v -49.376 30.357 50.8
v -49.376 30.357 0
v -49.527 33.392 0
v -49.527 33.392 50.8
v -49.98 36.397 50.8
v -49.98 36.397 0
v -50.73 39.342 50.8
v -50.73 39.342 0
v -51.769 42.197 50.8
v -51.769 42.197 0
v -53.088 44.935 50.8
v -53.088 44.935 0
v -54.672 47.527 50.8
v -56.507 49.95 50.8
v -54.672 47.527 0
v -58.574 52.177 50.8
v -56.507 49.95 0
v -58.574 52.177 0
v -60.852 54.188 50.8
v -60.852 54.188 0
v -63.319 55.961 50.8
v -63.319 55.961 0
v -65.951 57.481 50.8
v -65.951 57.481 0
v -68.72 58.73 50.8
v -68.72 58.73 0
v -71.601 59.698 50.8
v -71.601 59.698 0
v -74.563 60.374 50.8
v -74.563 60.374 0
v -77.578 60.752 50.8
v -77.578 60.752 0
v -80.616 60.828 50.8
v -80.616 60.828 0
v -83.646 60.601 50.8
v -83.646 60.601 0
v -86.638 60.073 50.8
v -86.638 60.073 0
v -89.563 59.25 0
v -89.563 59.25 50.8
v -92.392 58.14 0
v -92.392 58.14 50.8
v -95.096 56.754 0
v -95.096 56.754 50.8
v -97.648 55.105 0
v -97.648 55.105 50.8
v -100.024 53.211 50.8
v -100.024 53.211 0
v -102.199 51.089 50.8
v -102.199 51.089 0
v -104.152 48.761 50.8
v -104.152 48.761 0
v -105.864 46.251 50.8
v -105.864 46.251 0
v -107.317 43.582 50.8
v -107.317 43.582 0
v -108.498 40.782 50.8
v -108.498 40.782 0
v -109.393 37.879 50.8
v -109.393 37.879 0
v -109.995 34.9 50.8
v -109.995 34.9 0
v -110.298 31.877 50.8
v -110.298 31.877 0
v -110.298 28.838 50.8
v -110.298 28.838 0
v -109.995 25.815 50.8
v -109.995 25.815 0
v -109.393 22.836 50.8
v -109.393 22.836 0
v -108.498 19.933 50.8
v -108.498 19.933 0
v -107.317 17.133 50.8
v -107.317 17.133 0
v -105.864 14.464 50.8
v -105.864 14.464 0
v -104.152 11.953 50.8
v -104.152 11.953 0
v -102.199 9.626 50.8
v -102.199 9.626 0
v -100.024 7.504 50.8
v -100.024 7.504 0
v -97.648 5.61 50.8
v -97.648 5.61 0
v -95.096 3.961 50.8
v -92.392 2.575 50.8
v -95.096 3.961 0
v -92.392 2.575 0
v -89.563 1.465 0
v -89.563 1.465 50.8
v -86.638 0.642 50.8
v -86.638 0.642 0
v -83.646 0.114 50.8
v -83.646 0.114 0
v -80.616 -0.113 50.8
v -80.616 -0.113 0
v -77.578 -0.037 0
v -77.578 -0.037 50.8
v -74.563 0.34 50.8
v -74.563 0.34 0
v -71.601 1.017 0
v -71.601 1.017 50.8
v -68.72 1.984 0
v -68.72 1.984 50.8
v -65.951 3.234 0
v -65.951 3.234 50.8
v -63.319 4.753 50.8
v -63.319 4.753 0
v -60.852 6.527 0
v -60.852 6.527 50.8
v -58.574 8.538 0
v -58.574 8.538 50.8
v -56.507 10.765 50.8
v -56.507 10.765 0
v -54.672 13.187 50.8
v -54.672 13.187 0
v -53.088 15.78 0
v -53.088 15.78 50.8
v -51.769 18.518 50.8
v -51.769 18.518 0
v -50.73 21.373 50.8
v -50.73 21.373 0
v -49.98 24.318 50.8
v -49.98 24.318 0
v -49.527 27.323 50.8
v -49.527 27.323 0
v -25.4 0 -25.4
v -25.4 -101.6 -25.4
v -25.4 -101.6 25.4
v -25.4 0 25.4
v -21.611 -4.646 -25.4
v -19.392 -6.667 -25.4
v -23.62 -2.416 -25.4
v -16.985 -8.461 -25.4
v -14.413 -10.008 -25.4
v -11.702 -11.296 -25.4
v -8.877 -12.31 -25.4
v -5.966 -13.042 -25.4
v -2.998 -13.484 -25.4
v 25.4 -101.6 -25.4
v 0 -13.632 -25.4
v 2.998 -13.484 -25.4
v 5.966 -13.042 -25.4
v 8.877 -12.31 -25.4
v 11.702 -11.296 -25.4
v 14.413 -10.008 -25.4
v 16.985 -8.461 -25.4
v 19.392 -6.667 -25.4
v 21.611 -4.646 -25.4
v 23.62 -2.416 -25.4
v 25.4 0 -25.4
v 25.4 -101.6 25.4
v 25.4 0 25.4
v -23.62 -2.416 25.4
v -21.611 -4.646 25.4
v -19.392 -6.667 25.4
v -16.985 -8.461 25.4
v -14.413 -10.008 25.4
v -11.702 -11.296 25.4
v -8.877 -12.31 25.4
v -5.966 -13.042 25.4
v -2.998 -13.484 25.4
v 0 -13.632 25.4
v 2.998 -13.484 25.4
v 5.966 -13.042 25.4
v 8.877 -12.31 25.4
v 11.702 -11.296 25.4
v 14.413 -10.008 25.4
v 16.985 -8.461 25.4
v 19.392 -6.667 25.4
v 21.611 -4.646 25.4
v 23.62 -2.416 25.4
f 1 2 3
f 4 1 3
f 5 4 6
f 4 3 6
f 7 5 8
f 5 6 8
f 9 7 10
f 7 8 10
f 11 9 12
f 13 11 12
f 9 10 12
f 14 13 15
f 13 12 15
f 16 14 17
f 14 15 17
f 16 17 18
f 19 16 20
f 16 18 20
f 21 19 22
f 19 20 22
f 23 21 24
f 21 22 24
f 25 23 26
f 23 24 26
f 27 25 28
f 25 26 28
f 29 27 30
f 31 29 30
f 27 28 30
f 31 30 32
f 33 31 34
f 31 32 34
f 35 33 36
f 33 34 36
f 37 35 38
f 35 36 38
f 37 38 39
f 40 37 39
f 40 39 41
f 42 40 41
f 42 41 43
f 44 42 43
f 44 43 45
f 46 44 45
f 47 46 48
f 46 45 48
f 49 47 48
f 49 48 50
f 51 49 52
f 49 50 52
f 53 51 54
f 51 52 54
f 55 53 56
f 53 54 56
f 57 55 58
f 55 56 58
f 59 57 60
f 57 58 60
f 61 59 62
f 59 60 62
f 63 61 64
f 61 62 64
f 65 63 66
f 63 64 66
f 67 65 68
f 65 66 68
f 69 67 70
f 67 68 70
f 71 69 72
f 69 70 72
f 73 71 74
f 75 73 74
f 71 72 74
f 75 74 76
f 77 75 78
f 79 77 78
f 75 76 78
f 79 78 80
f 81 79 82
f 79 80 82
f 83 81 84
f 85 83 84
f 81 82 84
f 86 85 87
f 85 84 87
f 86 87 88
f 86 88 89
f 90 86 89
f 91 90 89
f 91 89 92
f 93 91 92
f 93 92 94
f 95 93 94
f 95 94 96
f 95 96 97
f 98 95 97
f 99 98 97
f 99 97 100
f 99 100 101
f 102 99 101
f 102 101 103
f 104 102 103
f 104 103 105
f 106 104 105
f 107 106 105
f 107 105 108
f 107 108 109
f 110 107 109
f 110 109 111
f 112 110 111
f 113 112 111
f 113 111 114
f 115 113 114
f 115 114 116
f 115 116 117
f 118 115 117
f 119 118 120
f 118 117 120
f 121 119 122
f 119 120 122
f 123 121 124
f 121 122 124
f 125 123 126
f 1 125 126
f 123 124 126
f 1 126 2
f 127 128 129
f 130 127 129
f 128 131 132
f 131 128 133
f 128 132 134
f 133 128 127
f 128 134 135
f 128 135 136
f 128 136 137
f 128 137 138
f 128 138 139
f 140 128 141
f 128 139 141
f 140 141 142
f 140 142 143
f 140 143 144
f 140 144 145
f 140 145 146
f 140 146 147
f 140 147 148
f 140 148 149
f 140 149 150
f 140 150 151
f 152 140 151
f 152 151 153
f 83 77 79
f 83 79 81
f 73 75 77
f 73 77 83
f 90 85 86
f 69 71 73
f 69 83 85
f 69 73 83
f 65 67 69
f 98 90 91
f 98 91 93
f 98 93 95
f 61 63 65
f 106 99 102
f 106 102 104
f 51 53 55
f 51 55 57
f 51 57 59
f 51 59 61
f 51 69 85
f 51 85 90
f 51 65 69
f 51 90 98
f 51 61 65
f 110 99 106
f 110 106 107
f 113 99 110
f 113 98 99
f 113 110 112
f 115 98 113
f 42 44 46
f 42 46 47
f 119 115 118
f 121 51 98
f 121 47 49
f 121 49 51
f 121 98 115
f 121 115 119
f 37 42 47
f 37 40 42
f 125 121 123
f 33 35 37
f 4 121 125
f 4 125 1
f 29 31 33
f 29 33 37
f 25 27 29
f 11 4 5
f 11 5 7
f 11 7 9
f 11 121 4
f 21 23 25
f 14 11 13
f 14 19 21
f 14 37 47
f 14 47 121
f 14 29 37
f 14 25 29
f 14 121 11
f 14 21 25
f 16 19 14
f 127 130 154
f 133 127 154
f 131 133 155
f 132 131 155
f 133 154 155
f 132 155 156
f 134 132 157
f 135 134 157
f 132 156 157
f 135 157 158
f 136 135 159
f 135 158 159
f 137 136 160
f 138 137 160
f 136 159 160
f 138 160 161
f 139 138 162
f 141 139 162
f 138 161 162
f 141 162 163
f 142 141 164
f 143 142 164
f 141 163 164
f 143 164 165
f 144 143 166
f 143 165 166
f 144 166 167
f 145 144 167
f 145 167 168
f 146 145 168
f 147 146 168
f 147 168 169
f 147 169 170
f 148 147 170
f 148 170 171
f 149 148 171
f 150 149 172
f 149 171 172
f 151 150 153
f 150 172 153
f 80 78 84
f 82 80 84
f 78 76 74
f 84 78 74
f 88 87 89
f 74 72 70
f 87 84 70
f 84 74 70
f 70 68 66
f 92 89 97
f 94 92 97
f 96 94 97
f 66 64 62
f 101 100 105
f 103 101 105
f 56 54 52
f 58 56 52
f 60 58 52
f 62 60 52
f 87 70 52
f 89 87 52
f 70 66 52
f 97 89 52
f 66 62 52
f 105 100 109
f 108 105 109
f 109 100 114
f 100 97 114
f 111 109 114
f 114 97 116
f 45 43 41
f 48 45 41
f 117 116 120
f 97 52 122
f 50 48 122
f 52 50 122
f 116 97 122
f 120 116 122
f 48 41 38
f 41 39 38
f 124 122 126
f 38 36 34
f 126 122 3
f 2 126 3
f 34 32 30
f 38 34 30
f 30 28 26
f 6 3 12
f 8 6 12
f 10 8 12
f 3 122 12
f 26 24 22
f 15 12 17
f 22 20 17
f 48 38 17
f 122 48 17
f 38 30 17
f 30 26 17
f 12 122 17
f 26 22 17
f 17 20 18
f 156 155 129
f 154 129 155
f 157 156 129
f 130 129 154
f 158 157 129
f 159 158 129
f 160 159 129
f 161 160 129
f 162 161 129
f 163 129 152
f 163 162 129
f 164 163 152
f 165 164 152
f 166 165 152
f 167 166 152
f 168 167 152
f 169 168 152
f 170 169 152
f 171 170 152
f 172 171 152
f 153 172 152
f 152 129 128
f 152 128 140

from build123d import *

# Parameters (mm, degrees)
F0_W     = 50.8
F0_H     = 50.8
F1_DEPTH = 101.6
F3_DEPTH = 50.801
F4_R     = 30.48
F5_DEPTH = 50.8


with BuildPart() as f1:
    # F0 (on Front) → F1 (new body)
    with BuildSketch(Plane.XZ):
        Rectangle(F0_W, F0_H)
    extrude(amount=F1_DEPTH)

    # F2 (on face) → F3 (cut, through all)
    with BuildSketch(Plane.XY.offset(25.4)):
        with BuildLine():
            Line((25.4, 0), (-25.4, 0))
            ThreePointArc((-25.4, 0), (0, -13.631546), (25.4, 0))
        make_face()
    extrude(amount=-F3_DEPTH, mode=Mode.SUBTRACT)


with BuildPart() as f5:
    # F4 (on Top) → F5 (new body)
    with BuildSketch(Plane.XY):
        with Locations((-79.855837, 30.357406)):
            Circle(F4_R)
    extrude(amount=F5_DEPTH)


solid = Compound([f1.part, f5.part])
